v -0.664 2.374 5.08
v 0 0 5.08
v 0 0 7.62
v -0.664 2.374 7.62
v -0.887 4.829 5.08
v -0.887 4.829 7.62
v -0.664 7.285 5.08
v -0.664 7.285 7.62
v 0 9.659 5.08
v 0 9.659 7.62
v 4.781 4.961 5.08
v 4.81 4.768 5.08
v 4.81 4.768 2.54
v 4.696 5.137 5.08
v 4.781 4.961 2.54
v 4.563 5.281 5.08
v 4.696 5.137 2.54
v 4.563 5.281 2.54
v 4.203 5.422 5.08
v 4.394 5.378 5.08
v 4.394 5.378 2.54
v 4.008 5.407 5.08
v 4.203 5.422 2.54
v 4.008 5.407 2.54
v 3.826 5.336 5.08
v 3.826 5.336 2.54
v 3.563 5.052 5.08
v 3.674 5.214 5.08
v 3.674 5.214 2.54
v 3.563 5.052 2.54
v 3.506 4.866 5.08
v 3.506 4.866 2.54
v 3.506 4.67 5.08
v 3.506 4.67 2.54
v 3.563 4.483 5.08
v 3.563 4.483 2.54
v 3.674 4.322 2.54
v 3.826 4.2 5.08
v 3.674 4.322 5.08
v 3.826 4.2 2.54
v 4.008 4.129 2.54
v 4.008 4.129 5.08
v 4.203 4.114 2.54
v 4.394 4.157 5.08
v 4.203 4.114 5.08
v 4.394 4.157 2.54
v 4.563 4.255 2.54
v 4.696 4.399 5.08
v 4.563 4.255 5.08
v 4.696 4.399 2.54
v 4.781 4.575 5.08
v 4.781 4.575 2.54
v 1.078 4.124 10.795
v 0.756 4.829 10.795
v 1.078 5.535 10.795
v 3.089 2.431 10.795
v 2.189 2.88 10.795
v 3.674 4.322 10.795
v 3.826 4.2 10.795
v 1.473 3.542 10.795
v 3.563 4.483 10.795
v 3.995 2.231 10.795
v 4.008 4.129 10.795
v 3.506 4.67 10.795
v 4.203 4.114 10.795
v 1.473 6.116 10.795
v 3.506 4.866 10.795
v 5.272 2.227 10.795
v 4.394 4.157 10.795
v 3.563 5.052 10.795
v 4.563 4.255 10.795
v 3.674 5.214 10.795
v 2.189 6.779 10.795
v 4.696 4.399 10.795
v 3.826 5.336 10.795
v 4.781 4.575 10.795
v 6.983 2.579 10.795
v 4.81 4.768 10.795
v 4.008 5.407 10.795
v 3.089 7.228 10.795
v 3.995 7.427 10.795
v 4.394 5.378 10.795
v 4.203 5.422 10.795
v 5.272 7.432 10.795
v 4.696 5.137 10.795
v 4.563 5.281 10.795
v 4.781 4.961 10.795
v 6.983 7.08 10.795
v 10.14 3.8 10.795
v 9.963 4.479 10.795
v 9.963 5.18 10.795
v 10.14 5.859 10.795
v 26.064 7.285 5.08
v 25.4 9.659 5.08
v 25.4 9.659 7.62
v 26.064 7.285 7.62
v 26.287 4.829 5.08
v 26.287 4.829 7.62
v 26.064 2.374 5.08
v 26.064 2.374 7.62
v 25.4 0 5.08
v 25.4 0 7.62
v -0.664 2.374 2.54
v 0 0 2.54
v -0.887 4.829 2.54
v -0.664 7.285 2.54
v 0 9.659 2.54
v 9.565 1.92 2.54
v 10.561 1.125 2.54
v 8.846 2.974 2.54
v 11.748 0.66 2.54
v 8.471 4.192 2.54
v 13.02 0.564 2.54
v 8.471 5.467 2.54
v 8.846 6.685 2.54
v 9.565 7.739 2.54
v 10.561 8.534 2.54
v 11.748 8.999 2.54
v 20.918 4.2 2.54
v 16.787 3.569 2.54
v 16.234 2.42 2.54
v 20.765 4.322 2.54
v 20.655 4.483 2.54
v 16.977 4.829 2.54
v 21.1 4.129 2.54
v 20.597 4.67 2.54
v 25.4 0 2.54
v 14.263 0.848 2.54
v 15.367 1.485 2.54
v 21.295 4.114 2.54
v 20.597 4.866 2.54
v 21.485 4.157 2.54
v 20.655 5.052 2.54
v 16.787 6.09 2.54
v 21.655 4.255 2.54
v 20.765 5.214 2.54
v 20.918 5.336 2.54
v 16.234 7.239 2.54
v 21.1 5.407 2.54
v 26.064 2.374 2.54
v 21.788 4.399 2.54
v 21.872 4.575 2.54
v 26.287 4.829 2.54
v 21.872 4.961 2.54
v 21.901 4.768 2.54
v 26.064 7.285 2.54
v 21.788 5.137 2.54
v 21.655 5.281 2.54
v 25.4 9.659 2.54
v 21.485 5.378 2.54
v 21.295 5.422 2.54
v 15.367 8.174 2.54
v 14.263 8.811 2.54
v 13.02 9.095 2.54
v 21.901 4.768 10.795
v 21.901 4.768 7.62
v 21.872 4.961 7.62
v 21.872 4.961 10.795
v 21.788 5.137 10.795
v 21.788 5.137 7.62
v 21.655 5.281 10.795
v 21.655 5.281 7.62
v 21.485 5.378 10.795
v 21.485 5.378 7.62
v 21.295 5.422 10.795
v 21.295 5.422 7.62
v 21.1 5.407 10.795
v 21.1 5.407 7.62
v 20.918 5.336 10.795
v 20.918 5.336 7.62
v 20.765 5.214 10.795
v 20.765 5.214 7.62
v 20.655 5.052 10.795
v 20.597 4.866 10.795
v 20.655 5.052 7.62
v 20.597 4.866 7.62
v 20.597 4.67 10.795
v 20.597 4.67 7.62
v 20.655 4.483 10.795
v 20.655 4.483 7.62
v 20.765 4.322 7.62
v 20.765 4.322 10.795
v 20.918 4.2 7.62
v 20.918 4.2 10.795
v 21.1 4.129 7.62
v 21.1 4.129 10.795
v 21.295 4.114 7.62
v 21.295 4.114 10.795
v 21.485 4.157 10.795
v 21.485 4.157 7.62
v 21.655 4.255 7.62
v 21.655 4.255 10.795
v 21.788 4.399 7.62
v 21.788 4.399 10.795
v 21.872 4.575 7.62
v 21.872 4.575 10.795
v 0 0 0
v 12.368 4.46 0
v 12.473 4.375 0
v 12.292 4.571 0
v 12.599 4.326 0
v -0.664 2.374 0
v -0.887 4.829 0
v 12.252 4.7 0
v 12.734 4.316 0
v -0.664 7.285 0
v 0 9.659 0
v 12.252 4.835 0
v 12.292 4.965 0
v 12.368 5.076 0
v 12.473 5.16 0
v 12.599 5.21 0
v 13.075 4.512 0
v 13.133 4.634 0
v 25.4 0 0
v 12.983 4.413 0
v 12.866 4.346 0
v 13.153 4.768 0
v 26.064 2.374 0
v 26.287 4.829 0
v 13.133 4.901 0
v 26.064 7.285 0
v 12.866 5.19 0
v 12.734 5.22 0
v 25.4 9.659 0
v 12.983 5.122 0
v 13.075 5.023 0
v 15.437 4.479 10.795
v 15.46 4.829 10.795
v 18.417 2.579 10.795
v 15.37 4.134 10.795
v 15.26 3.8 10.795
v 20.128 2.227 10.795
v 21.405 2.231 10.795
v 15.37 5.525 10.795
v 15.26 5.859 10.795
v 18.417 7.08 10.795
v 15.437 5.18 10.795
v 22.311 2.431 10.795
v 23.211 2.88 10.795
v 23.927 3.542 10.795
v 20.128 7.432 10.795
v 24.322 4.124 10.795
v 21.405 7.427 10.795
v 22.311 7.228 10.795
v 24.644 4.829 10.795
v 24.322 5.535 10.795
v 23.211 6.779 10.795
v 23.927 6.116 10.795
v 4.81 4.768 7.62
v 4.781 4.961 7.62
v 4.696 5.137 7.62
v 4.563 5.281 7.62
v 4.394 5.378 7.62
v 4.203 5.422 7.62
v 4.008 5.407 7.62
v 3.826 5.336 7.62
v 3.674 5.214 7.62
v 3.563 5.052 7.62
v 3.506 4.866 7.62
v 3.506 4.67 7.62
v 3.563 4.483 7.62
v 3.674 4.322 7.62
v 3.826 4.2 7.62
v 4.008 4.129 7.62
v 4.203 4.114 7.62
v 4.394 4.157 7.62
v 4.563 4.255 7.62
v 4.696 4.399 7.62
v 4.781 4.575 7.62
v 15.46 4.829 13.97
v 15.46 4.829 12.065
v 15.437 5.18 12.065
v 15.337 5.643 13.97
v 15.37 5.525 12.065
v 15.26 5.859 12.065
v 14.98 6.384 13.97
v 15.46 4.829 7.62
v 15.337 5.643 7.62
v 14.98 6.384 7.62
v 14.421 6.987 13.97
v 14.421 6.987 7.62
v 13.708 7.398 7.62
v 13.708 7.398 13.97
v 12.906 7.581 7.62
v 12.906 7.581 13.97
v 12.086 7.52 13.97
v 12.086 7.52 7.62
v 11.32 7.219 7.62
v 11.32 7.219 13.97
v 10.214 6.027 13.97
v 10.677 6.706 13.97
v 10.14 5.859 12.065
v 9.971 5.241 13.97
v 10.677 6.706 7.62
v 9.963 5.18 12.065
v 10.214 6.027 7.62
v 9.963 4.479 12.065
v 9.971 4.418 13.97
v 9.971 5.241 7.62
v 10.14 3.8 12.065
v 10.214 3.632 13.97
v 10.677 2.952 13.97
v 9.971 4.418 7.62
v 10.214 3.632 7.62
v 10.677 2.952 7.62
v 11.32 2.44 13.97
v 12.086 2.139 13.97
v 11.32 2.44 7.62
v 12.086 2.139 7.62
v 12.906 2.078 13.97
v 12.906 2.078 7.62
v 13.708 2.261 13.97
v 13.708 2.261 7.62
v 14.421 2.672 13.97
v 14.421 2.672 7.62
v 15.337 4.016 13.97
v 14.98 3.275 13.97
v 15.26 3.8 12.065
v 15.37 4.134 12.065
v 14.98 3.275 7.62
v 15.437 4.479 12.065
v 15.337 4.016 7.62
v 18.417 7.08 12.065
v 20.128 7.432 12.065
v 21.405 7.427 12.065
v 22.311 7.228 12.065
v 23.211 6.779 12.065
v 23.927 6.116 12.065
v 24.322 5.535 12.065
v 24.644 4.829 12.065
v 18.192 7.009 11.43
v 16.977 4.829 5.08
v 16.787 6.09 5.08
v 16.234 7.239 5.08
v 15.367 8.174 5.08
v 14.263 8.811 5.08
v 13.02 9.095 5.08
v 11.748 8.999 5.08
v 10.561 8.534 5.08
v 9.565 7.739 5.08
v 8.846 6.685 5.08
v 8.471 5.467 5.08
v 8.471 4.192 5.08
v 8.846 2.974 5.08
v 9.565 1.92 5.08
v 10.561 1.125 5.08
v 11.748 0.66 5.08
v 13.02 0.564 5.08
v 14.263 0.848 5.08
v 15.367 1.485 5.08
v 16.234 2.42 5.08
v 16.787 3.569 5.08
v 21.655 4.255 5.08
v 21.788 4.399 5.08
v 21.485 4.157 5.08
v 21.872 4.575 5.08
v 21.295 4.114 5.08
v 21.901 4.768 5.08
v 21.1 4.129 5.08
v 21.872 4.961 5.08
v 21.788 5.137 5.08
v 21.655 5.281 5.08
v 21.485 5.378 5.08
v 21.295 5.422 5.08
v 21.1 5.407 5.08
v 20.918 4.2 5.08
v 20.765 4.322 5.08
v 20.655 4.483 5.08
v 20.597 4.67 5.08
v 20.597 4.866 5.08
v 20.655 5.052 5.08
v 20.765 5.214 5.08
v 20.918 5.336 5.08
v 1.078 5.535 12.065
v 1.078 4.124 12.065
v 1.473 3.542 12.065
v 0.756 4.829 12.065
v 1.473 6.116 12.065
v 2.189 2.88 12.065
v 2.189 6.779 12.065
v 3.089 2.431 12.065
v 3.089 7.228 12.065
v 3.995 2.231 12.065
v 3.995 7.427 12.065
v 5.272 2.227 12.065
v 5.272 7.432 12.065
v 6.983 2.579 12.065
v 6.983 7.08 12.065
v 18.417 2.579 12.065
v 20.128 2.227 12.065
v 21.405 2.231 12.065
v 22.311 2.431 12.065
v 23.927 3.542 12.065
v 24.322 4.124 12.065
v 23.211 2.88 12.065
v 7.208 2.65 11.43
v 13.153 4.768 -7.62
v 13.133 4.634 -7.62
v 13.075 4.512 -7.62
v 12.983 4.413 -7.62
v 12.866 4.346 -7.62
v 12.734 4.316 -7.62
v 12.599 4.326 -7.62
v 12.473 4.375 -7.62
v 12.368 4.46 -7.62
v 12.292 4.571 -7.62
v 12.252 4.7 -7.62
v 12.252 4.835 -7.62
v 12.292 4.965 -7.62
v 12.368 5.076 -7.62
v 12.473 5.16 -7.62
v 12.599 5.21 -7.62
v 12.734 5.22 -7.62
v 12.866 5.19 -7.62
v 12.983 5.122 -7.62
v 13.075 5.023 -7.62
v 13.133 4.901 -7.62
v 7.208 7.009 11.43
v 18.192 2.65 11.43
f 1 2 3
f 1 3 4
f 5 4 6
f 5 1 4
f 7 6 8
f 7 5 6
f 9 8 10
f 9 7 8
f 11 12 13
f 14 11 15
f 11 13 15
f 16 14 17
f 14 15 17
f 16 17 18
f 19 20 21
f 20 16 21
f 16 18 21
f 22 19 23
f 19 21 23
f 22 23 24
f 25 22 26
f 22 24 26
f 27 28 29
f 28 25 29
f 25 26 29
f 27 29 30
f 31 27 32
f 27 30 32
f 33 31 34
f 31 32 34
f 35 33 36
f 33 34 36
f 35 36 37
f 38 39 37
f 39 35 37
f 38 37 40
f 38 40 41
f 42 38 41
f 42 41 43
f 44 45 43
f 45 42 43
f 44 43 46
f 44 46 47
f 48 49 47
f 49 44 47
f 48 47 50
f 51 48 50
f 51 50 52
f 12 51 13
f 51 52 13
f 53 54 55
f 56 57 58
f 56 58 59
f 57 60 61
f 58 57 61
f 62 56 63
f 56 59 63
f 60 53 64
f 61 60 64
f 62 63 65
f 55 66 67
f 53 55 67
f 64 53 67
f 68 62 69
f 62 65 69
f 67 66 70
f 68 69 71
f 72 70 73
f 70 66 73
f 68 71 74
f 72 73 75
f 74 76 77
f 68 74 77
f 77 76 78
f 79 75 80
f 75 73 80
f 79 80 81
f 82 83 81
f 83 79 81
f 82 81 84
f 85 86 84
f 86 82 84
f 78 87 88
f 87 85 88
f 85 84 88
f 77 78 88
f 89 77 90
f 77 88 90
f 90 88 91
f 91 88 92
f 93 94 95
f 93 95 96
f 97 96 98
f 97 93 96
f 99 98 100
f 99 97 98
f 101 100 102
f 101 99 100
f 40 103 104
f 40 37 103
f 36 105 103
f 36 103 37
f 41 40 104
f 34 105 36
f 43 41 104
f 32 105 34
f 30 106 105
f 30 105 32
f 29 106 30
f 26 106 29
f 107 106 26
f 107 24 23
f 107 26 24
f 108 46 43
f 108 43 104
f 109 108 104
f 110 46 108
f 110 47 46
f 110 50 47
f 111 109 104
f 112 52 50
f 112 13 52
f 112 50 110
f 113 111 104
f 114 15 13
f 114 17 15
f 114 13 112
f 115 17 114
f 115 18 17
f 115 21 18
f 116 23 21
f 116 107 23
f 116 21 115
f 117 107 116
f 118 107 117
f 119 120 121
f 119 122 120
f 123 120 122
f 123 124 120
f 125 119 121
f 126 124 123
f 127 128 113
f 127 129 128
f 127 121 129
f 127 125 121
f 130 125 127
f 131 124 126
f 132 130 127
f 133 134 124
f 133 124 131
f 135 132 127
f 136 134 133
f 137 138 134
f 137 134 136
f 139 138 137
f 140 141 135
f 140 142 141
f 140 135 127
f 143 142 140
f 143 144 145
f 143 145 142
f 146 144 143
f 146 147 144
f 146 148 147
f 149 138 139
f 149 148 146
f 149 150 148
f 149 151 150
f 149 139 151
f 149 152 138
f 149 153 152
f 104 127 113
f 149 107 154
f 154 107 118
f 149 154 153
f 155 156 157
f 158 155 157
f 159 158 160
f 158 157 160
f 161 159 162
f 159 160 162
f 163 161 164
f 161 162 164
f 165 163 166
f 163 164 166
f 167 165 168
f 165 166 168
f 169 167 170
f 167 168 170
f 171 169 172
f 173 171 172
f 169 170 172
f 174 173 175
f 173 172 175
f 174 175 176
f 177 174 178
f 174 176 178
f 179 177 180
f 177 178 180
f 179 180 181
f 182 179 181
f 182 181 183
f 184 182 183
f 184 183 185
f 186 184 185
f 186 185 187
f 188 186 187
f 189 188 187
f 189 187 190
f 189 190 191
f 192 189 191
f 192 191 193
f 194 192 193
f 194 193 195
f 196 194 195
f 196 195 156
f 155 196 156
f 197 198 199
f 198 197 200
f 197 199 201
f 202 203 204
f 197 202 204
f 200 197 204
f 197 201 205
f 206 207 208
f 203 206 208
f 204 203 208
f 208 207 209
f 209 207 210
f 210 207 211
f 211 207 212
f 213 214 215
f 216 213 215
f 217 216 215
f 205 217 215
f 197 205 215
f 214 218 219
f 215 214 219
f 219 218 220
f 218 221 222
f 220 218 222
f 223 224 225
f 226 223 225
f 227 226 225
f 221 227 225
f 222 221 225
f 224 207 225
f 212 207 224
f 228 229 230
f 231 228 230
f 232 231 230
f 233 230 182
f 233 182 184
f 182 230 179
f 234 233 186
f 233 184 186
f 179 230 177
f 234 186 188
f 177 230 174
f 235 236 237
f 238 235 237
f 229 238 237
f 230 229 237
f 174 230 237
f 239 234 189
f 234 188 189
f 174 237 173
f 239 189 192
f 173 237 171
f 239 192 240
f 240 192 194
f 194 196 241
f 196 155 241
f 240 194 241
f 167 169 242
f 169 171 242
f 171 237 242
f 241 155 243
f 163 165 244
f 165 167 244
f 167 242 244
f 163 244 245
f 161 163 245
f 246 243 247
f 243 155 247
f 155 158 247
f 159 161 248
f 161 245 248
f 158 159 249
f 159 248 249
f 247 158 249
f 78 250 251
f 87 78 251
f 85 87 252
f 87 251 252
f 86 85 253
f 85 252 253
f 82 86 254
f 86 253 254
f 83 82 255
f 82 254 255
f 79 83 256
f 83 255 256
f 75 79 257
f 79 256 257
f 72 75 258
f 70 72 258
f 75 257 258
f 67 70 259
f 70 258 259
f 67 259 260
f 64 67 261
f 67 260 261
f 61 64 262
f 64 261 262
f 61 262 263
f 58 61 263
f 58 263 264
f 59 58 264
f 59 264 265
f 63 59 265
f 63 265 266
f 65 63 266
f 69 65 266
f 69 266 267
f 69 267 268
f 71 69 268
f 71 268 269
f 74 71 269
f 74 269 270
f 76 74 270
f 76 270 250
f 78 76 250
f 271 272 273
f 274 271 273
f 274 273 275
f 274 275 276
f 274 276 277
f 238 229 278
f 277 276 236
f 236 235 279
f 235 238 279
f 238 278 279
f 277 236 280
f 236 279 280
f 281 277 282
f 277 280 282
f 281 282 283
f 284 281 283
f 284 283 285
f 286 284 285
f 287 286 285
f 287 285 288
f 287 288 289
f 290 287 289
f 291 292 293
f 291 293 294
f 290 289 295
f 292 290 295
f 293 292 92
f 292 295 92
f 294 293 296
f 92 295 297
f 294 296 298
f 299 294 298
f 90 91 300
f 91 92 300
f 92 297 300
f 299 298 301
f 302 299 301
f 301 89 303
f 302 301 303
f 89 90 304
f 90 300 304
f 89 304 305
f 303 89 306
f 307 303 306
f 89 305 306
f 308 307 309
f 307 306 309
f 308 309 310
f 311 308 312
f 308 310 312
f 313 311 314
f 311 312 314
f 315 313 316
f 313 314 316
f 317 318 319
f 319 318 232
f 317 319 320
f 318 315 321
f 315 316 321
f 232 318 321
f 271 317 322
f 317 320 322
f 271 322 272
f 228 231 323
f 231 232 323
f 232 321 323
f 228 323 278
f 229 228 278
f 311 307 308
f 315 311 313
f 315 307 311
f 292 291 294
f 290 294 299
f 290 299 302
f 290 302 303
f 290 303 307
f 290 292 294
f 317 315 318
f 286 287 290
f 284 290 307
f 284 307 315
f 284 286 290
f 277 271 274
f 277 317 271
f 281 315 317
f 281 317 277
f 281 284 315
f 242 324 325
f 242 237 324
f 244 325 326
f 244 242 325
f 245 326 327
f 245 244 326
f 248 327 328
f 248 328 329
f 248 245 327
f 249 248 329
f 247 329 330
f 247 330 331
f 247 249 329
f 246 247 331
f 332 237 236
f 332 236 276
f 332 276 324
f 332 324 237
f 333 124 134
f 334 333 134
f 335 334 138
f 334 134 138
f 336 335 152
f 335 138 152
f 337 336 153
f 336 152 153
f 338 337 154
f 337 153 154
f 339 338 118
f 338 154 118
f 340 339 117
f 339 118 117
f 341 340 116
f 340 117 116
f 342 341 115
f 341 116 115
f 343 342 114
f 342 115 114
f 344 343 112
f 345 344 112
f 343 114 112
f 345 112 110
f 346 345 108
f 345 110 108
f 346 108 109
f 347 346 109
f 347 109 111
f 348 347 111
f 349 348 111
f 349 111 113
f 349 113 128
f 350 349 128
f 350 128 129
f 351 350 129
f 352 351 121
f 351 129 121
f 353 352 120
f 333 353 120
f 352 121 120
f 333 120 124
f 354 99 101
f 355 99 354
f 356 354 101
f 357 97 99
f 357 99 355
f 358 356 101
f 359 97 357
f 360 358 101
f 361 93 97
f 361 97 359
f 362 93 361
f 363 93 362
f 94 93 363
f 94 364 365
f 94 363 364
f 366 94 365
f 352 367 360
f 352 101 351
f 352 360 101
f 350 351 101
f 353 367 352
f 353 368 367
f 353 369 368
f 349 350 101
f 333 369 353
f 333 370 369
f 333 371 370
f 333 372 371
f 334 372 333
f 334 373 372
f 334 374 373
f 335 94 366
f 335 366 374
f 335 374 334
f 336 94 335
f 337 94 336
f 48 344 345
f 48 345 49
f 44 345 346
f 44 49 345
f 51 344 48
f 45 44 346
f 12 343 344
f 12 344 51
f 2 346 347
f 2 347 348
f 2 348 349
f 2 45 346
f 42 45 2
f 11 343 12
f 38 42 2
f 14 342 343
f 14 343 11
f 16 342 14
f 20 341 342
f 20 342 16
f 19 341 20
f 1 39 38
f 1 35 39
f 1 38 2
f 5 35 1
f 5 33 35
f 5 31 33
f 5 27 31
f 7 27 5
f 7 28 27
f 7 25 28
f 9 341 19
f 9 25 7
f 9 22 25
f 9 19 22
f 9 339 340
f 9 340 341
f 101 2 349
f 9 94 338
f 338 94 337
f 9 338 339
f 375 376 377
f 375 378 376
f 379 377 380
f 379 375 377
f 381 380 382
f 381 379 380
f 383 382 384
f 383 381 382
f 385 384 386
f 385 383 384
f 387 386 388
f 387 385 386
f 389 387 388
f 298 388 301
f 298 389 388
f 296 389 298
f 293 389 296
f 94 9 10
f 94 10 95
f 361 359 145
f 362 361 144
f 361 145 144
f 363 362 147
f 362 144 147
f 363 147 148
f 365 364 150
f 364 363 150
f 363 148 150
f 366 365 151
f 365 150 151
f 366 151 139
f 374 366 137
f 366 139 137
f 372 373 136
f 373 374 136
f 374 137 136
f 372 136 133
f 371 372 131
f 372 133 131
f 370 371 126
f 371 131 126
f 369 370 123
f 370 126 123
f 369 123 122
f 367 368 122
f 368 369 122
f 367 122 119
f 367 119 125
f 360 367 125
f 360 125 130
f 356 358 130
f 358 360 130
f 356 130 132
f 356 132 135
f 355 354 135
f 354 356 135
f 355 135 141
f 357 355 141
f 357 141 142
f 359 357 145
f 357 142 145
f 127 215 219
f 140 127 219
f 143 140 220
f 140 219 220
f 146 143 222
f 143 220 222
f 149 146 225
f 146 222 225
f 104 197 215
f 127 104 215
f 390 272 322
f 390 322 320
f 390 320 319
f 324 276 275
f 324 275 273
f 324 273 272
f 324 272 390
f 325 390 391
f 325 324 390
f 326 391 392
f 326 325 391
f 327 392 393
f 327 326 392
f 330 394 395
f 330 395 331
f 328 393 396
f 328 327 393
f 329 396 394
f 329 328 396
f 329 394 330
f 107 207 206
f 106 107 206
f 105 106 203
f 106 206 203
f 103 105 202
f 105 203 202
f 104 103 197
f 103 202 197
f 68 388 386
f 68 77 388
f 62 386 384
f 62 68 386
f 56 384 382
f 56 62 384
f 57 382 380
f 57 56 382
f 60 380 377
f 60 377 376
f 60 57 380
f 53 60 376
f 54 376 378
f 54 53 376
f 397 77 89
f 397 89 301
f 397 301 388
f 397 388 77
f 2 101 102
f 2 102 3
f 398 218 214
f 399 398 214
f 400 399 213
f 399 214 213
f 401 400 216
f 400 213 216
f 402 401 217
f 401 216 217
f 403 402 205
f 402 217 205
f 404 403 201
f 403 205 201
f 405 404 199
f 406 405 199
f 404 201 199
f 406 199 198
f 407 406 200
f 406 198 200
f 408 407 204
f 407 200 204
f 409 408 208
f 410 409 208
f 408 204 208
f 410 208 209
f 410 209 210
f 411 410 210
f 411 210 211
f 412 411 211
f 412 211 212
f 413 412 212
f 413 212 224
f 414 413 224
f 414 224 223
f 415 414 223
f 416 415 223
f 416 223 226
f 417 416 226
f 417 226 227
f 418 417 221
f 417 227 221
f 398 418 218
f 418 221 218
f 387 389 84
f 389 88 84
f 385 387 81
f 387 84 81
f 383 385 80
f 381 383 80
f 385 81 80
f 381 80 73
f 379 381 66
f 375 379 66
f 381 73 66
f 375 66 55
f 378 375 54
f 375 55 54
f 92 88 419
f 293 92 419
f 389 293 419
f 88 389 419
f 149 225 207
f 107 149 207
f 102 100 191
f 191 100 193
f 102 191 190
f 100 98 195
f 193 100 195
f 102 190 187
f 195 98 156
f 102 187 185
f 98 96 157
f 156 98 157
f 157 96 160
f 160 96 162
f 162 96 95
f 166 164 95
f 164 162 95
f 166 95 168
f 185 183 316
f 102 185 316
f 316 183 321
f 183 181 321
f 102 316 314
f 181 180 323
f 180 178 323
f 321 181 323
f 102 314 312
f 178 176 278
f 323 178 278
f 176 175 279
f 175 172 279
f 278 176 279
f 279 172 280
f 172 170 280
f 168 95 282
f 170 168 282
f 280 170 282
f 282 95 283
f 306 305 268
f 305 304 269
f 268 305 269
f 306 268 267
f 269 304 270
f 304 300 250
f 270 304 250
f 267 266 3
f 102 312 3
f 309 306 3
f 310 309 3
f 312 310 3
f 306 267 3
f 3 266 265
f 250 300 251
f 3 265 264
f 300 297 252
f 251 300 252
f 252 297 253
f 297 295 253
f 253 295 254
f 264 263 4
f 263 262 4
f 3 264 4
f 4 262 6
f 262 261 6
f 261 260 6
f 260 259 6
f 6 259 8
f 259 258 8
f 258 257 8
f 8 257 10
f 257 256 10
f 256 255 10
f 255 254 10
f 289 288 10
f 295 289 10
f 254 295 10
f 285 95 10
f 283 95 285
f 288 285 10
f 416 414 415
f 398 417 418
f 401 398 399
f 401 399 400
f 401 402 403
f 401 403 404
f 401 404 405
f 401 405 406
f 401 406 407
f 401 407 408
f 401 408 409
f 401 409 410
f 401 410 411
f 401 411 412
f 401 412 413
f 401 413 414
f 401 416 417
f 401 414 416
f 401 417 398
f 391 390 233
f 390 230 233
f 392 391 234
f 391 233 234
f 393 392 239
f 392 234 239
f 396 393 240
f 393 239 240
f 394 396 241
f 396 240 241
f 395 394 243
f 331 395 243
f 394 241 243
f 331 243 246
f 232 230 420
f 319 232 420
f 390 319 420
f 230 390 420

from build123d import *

# Parameters (mm, degrees)
BOSS_EXTRUDE1_DEPTH = 2.54
SKETCH2_R           = 4.277185328
BOSS_EXTRUDE2_DEPTH = 2.54
BOSS_EXTRUDE3_START = 2.54
BOSS_EXTRUDE3_DEPTH = 2.54
BOSS_EXTRUDE4_START = 3.175
BOSS_EXTRUDE4_DEPTH = 1.27
BOSS_EXTRUDE5_START = -9.525
SKETCH6_R           = 0.655755768
BOSS_EXTRUDE5_DEPTH = 8.255
SKETCH7_R           = 2.759618061
BOSS_EXTRUDE6_DEPTH = 6.35
SKETCH8_R           = 0.453273613
BOSS_EXTRUDE7_DEPTH = 7.62


with BuildPart() as part:
    # Sketch1 → Boss-Extrude1 (new body)
    with BuildSketch(Plane.XY):
        with BuildLine():
            Line((0, 0), (25.4, 0))
            ThreePointArc((25.4, 0), (26.287266684, 4.829473672), (25.4, 9.658947345))
            Line((25.4, 9.658947345), (0, 9.658947345))
            ThreePointArc((0, 9.658947345), (-0.887266684, 4.829473672), (0, 0))
        make_face()
    extrude(amount=BOSS_EXTRUDE1_DEPTH)

    # Sketch2 → Boss-Extrude2 (add)
    with BuildSketch(Plane.XY.offset(2.54)):
        with Locations((12.7, 4.829473672)):
            Circle(SKETCH2_R)
    extrude(amount=BOSS_EXTRUDE2_DEPTH)

    # Sketch4 → Boss-Extrude3 (add)
    with BuildSketch(Plane.XY.offset(2.54).offset(BOSS_EXTRUDE3_START)):
        with BuildLine():
            Line((25.4, 0), (0, 0))
            ThreePointArc((0, 0), (-0.887266684, 4.829473672), (0, 9.658947345))
            Line((0, 9.658947345), (25.4, 9.658947345))
            ThreePointArc((25.4, 9.658947345), (26.287266684, 4.829473672), (25.4, 0))
        make_face()
    extrude(amount=BOSS_EXTRUDE3_DEPTH)



with BuildPart() as body_2:
    # Sketch5 → Boss-Extrude4 (new body)
    with BuildSketch(Plane.XY.offset(7.62).offset(BOSS_EXTRUDE4_START)):
        with BuildLine():
            add(Edge.make_bspline(
                [(12.7, 4.20147434), (14.810733294, 4.318694194), (18.338650019, 1.879191252), (23.539856959, 1.828704507), (24.644301026, 4.829473672)],
                knots=[0, 0, 0, 0, 0.434443821, 1, 1, 1, 1], degree=3))
            add(Edge.make_bspline(
                [(12.7, 5.457473005), (14.810733294, 5.340253151), (18.338650019, 7.779756093), (23.539856959, 7.830242837), (24.644301026, 4.829473672)],
                knots=[0, 0, 0, 0, 0.434443821, 1, 1, 1, 1], degree=3))
            add(Edge.make_bspline(
                [(12.7, 5.457473005), (10.589266706, 5.340253151), (7.061349981, 7.779756093), (1.860143041, 7.830242837), (0.755698974, 4.829473672)],
                knots=[0, 0, 0, 0, 0.434443821, 1, 1, 1, 1], degree=3))
            add(Edge.make_bspline(
                [(12.7, 4.20147434), (10.589266706, 4.318694194), (7.061349981, 1.879191252), (1.860143041, 1.828704507), (0.755698974, 4.829473672)],
                knots=[0, 0, 0, 0, 0.434443821, 1, 1, 1, 1], degree=3))
        make_face()
    extrude(amount=BOSS_EXTRUDE4_DEPTH)


with BuildPart() as part_1:
    add(part.part)

    add(body_2.part)  # Boss-Extrude5 merges body 2
    # Sketch6 → Boss-Extrude5 (add)
    with BuildSketch(Plane.XY.offset(12.065).offset(BOSS_EXTRUDE5_START)):
        with Locations((21.245716404, 4.76790511)):
            Circle(SKETCH6_R)
        with Locations((4.154283596, 4.76790511)):
            Circle(SKETCH6_R)
    extrude(amount=BOSS_EXTRUDE5_DEPTH)

    # Sketch7 → Boss-Extrude6 (add)
    with BuildSketch(Plane.XY.offset(7.62)):
        with Locations((12.7, 4.829473672)):
            Circle(SKETCH7_R)
    extrude(amount=BOSS_EXTRUDE6_DEPTH)

    # Sketch8 → Boss-Extrude7 (add)
    with BuildSketch(Plane(origin=(0, 0, 0), x_dir=(-1, 0, 0), z_dir=(0, 0, -1))):
        with Locations(Location((-12.7, 4.767836587, 0), (0, 0, 180))):
            Circle(SKETCH8_R)
    extrude(amount=BOSS_EXTRUDE7_DEPTH)


solid = part_1.part
